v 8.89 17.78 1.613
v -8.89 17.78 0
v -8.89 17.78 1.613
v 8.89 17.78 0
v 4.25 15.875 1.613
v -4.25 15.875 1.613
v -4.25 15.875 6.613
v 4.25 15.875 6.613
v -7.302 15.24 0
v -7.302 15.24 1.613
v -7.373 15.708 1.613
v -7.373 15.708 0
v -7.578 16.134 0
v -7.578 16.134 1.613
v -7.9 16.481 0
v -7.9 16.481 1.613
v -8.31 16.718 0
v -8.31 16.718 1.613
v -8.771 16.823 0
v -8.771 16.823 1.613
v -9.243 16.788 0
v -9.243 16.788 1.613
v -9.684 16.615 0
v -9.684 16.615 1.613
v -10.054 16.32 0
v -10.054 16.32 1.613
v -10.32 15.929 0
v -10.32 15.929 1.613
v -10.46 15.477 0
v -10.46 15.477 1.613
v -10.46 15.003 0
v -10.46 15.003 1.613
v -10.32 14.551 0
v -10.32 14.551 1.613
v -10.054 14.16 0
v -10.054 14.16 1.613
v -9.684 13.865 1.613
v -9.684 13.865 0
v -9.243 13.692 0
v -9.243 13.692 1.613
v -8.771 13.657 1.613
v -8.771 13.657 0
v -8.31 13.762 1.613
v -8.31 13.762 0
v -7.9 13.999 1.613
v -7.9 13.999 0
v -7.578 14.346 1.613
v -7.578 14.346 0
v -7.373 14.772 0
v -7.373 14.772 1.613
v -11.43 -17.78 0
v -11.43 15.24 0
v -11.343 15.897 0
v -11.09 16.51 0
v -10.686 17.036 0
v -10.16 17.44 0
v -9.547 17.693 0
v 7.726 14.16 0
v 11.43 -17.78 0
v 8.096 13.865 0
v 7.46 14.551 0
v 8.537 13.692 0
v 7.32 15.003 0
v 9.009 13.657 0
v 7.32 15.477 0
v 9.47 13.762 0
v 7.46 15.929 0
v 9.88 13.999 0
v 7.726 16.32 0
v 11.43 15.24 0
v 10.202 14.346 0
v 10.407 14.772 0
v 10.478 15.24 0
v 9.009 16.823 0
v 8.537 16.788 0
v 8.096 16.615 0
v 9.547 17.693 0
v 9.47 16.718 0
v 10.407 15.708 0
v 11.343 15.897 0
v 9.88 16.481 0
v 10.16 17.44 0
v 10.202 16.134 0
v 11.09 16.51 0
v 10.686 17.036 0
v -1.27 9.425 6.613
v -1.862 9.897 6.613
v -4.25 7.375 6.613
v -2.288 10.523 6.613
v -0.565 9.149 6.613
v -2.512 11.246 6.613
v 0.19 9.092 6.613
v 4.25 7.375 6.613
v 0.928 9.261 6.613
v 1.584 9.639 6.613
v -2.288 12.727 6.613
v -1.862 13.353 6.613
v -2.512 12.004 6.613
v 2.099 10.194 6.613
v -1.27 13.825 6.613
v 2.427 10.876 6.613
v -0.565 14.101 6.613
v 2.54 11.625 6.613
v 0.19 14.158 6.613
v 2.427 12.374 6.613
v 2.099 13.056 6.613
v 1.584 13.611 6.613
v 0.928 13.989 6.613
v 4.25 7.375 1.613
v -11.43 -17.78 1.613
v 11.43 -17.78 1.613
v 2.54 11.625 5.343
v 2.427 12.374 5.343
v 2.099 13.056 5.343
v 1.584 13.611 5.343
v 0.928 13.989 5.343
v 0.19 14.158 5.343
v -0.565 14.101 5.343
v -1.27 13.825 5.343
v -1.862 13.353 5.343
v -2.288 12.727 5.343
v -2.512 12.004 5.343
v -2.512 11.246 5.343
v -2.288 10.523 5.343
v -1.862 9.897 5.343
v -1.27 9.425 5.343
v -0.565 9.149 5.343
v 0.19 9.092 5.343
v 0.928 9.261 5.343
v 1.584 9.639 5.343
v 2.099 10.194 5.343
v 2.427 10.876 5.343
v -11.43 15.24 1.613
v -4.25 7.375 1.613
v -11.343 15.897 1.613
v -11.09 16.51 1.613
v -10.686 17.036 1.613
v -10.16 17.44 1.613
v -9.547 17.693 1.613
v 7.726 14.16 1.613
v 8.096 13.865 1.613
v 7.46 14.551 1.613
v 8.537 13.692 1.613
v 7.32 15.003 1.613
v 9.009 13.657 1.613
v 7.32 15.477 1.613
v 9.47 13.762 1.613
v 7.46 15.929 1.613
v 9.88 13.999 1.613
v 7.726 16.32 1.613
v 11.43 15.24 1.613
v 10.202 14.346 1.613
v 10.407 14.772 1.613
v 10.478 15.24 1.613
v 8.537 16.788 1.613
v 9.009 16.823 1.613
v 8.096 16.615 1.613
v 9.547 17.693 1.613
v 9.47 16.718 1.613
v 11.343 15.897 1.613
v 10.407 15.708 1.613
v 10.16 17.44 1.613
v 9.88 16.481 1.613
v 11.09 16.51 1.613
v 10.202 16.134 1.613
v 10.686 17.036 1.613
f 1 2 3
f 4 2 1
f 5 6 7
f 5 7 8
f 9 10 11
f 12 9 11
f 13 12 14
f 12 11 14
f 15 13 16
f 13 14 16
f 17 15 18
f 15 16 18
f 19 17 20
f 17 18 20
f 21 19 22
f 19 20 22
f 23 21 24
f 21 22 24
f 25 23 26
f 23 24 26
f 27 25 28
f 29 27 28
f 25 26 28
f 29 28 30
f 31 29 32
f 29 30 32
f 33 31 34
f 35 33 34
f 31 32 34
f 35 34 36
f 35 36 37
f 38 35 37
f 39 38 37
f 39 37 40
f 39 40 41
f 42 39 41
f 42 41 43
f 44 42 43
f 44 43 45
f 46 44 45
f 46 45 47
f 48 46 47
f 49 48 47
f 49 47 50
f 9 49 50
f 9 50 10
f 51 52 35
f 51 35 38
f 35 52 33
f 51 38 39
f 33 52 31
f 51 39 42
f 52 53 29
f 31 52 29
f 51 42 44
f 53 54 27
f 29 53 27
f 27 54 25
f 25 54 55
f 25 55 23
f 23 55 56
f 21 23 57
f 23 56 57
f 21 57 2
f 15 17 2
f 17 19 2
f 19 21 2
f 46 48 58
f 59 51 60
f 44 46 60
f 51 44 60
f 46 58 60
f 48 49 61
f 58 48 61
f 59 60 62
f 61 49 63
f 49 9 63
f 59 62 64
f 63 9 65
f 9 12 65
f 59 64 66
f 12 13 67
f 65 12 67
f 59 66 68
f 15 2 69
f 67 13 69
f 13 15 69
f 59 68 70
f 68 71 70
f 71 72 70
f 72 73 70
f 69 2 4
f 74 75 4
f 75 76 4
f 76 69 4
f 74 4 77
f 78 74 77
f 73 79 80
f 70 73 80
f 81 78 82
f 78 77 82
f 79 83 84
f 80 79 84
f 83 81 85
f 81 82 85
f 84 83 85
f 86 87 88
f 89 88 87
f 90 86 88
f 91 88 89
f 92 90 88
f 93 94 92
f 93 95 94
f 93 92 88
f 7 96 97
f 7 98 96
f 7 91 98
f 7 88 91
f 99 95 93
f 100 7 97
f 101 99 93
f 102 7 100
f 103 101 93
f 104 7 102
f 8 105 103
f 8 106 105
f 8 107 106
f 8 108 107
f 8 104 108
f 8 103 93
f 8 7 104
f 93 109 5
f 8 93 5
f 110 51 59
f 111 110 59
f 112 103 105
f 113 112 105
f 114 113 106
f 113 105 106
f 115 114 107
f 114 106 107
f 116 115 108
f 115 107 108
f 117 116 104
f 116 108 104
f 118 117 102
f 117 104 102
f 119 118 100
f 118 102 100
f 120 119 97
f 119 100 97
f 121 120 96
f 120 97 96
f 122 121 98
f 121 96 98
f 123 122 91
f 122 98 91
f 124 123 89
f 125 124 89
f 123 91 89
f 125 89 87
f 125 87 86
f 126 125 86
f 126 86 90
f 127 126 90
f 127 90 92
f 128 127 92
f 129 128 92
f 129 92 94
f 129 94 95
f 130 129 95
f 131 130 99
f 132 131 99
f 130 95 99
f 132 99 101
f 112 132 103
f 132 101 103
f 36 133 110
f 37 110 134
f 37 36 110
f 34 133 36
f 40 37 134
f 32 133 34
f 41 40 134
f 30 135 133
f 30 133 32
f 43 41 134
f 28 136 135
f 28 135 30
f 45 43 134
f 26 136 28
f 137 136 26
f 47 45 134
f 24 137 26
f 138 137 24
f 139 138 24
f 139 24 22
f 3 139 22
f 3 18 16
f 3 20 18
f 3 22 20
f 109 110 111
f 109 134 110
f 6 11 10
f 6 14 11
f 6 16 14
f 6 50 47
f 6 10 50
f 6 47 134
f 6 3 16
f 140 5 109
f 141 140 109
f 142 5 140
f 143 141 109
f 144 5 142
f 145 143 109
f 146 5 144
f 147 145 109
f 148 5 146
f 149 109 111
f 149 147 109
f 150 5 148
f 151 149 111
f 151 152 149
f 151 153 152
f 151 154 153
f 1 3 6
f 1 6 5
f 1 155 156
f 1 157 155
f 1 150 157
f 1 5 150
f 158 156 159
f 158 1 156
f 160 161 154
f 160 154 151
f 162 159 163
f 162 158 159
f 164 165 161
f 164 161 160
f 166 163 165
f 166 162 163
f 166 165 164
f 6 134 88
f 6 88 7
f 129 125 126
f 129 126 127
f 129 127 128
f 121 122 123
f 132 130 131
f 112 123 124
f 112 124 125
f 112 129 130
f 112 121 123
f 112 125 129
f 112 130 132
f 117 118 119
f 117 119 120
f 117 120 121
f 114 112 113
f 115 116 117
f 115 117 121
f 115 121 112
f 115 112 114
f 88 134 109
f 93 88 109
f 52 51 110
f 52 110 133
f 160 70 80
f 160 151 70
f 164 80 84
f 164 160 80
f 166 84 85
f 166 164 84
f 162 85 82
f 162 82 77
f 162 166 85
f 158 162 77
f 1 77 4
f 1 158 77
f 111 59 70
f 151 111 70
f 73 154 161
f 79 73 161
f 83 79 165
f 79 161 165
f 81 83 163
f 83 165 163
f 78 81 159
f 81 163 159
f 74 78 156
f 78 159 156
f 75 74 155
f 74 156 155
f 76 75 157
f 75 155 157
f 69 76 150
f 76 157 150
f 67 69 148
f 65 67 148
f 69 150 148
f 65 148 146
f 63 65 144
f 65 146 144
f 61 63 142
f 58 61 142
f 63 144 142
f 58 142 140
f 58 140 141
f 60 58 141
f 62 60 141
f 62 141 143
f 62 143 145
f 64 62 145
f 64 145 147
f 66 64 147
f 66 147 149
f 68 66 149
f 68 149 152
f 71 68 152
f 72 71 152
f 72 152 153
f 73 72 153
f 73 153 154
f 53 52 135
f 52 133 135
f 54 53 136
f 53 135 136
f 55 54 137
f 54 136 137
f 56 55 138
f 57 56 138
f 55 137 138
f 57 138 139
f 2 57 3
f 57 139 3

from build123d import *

# Parameters (mm, degrees)
SKETCH1_W           = 22.86
SKETCH1_H           = 35.56
BOSS_EXTRUDE1_DEPTH = 1.6129
FILLET1_R           = 2.54
SKETCH2_W           = 8.5
SKETCH2_H           = 8.5
BOSS_EXTRUDE2_DEPTH = 5
CUT_EXTRUDE1_REACH  = 3.613
SKETCH3_R           = 1.5875
SKETCH4_R           = 2.54
CUT_EXTRUDE2_DEPTH  = 1.27


with BuildPart() as part:
    # Sketch1 → Boss-Extrude1 (new body)
    with BuildSketch(Plane.XY):
        Rectangle(SKETCH1_W, SKETCH1_H)
    extrude(amount=BOSS_EXTRUDE1_DEPTH)

    # Fillet1
    fillet1_edges = [part.edges().sort_by_distance(p)[0] for p in [
        (-11.43, 17.78, 0.80645),
        (11.43, 17.78, 0.80645),
    ]]
    fillet(fillet1_edges, radius=FILLET1_R)

    # Sketch2 → Boss-Extrude2 (add)
    with BuildSketch(Plane.XY.offset(1.6129)):
        with Locations((0, 11.625)):
            Rectangle(SKETCH2_W, SKETCH2_H)
    extrude(amount=BOSS_EXTRUDE2_DEPTH)

    # Sketch3 → Cut-Extrude1 (cut, up to next)
    with BuildSketch(Plane.XY.offset(1.6129), mode=Mode.PRIVATE) as cut_extrude1_sk1:
        with Locations((-8.89, 15.24)):
            Circle(SKETCH3_R)
    cut_extrude1_tool1 = extrude(cut_extrude1_sk1.sketch, amount=-CUT_EXTRUDE1_REACH, mode=Mode.PRIVATE) & part.part
    add(cut_extrude1_tool1.solids().sort_by_distance((-8.89, 15.24, 1.6129))[0], mode=Mode.SUBTRACT)
    # Sketch3 → Cut-Extrude1 (cut, up to next)
    with BuildSketch(Plane.XY.offset(1.6129), mode=Mode.PRIVATE) as cut_extrude1_sk2:
        with Locations((8.89, 15.24)):
            Circle(SKETCH3_R)
    cut_extrude1_tool2 = extrude(cut_extrude1_sk2.sketch, amount=-CUT_EXTRUDE1_REACH, mode=Mode.PRIVATE) & part.part
    add(cut_extrude1_tool2.solids().sort_by_distance((8.89, 15.24, 1.6129))[0], mode=Mode.SUBTRACT)

    # Sketch4 → Cut-Extrude2 (cut)
    with BuildSketch(Plane.XY.offset(6.6129)):
        with Locations((0, 11.625)):
            Circle(SKETCH4_R)
    extrude(amount=-CUT_EXTRUDE2_DEPTH, mode=Mode.SUBTRACT)


solid = part.part
